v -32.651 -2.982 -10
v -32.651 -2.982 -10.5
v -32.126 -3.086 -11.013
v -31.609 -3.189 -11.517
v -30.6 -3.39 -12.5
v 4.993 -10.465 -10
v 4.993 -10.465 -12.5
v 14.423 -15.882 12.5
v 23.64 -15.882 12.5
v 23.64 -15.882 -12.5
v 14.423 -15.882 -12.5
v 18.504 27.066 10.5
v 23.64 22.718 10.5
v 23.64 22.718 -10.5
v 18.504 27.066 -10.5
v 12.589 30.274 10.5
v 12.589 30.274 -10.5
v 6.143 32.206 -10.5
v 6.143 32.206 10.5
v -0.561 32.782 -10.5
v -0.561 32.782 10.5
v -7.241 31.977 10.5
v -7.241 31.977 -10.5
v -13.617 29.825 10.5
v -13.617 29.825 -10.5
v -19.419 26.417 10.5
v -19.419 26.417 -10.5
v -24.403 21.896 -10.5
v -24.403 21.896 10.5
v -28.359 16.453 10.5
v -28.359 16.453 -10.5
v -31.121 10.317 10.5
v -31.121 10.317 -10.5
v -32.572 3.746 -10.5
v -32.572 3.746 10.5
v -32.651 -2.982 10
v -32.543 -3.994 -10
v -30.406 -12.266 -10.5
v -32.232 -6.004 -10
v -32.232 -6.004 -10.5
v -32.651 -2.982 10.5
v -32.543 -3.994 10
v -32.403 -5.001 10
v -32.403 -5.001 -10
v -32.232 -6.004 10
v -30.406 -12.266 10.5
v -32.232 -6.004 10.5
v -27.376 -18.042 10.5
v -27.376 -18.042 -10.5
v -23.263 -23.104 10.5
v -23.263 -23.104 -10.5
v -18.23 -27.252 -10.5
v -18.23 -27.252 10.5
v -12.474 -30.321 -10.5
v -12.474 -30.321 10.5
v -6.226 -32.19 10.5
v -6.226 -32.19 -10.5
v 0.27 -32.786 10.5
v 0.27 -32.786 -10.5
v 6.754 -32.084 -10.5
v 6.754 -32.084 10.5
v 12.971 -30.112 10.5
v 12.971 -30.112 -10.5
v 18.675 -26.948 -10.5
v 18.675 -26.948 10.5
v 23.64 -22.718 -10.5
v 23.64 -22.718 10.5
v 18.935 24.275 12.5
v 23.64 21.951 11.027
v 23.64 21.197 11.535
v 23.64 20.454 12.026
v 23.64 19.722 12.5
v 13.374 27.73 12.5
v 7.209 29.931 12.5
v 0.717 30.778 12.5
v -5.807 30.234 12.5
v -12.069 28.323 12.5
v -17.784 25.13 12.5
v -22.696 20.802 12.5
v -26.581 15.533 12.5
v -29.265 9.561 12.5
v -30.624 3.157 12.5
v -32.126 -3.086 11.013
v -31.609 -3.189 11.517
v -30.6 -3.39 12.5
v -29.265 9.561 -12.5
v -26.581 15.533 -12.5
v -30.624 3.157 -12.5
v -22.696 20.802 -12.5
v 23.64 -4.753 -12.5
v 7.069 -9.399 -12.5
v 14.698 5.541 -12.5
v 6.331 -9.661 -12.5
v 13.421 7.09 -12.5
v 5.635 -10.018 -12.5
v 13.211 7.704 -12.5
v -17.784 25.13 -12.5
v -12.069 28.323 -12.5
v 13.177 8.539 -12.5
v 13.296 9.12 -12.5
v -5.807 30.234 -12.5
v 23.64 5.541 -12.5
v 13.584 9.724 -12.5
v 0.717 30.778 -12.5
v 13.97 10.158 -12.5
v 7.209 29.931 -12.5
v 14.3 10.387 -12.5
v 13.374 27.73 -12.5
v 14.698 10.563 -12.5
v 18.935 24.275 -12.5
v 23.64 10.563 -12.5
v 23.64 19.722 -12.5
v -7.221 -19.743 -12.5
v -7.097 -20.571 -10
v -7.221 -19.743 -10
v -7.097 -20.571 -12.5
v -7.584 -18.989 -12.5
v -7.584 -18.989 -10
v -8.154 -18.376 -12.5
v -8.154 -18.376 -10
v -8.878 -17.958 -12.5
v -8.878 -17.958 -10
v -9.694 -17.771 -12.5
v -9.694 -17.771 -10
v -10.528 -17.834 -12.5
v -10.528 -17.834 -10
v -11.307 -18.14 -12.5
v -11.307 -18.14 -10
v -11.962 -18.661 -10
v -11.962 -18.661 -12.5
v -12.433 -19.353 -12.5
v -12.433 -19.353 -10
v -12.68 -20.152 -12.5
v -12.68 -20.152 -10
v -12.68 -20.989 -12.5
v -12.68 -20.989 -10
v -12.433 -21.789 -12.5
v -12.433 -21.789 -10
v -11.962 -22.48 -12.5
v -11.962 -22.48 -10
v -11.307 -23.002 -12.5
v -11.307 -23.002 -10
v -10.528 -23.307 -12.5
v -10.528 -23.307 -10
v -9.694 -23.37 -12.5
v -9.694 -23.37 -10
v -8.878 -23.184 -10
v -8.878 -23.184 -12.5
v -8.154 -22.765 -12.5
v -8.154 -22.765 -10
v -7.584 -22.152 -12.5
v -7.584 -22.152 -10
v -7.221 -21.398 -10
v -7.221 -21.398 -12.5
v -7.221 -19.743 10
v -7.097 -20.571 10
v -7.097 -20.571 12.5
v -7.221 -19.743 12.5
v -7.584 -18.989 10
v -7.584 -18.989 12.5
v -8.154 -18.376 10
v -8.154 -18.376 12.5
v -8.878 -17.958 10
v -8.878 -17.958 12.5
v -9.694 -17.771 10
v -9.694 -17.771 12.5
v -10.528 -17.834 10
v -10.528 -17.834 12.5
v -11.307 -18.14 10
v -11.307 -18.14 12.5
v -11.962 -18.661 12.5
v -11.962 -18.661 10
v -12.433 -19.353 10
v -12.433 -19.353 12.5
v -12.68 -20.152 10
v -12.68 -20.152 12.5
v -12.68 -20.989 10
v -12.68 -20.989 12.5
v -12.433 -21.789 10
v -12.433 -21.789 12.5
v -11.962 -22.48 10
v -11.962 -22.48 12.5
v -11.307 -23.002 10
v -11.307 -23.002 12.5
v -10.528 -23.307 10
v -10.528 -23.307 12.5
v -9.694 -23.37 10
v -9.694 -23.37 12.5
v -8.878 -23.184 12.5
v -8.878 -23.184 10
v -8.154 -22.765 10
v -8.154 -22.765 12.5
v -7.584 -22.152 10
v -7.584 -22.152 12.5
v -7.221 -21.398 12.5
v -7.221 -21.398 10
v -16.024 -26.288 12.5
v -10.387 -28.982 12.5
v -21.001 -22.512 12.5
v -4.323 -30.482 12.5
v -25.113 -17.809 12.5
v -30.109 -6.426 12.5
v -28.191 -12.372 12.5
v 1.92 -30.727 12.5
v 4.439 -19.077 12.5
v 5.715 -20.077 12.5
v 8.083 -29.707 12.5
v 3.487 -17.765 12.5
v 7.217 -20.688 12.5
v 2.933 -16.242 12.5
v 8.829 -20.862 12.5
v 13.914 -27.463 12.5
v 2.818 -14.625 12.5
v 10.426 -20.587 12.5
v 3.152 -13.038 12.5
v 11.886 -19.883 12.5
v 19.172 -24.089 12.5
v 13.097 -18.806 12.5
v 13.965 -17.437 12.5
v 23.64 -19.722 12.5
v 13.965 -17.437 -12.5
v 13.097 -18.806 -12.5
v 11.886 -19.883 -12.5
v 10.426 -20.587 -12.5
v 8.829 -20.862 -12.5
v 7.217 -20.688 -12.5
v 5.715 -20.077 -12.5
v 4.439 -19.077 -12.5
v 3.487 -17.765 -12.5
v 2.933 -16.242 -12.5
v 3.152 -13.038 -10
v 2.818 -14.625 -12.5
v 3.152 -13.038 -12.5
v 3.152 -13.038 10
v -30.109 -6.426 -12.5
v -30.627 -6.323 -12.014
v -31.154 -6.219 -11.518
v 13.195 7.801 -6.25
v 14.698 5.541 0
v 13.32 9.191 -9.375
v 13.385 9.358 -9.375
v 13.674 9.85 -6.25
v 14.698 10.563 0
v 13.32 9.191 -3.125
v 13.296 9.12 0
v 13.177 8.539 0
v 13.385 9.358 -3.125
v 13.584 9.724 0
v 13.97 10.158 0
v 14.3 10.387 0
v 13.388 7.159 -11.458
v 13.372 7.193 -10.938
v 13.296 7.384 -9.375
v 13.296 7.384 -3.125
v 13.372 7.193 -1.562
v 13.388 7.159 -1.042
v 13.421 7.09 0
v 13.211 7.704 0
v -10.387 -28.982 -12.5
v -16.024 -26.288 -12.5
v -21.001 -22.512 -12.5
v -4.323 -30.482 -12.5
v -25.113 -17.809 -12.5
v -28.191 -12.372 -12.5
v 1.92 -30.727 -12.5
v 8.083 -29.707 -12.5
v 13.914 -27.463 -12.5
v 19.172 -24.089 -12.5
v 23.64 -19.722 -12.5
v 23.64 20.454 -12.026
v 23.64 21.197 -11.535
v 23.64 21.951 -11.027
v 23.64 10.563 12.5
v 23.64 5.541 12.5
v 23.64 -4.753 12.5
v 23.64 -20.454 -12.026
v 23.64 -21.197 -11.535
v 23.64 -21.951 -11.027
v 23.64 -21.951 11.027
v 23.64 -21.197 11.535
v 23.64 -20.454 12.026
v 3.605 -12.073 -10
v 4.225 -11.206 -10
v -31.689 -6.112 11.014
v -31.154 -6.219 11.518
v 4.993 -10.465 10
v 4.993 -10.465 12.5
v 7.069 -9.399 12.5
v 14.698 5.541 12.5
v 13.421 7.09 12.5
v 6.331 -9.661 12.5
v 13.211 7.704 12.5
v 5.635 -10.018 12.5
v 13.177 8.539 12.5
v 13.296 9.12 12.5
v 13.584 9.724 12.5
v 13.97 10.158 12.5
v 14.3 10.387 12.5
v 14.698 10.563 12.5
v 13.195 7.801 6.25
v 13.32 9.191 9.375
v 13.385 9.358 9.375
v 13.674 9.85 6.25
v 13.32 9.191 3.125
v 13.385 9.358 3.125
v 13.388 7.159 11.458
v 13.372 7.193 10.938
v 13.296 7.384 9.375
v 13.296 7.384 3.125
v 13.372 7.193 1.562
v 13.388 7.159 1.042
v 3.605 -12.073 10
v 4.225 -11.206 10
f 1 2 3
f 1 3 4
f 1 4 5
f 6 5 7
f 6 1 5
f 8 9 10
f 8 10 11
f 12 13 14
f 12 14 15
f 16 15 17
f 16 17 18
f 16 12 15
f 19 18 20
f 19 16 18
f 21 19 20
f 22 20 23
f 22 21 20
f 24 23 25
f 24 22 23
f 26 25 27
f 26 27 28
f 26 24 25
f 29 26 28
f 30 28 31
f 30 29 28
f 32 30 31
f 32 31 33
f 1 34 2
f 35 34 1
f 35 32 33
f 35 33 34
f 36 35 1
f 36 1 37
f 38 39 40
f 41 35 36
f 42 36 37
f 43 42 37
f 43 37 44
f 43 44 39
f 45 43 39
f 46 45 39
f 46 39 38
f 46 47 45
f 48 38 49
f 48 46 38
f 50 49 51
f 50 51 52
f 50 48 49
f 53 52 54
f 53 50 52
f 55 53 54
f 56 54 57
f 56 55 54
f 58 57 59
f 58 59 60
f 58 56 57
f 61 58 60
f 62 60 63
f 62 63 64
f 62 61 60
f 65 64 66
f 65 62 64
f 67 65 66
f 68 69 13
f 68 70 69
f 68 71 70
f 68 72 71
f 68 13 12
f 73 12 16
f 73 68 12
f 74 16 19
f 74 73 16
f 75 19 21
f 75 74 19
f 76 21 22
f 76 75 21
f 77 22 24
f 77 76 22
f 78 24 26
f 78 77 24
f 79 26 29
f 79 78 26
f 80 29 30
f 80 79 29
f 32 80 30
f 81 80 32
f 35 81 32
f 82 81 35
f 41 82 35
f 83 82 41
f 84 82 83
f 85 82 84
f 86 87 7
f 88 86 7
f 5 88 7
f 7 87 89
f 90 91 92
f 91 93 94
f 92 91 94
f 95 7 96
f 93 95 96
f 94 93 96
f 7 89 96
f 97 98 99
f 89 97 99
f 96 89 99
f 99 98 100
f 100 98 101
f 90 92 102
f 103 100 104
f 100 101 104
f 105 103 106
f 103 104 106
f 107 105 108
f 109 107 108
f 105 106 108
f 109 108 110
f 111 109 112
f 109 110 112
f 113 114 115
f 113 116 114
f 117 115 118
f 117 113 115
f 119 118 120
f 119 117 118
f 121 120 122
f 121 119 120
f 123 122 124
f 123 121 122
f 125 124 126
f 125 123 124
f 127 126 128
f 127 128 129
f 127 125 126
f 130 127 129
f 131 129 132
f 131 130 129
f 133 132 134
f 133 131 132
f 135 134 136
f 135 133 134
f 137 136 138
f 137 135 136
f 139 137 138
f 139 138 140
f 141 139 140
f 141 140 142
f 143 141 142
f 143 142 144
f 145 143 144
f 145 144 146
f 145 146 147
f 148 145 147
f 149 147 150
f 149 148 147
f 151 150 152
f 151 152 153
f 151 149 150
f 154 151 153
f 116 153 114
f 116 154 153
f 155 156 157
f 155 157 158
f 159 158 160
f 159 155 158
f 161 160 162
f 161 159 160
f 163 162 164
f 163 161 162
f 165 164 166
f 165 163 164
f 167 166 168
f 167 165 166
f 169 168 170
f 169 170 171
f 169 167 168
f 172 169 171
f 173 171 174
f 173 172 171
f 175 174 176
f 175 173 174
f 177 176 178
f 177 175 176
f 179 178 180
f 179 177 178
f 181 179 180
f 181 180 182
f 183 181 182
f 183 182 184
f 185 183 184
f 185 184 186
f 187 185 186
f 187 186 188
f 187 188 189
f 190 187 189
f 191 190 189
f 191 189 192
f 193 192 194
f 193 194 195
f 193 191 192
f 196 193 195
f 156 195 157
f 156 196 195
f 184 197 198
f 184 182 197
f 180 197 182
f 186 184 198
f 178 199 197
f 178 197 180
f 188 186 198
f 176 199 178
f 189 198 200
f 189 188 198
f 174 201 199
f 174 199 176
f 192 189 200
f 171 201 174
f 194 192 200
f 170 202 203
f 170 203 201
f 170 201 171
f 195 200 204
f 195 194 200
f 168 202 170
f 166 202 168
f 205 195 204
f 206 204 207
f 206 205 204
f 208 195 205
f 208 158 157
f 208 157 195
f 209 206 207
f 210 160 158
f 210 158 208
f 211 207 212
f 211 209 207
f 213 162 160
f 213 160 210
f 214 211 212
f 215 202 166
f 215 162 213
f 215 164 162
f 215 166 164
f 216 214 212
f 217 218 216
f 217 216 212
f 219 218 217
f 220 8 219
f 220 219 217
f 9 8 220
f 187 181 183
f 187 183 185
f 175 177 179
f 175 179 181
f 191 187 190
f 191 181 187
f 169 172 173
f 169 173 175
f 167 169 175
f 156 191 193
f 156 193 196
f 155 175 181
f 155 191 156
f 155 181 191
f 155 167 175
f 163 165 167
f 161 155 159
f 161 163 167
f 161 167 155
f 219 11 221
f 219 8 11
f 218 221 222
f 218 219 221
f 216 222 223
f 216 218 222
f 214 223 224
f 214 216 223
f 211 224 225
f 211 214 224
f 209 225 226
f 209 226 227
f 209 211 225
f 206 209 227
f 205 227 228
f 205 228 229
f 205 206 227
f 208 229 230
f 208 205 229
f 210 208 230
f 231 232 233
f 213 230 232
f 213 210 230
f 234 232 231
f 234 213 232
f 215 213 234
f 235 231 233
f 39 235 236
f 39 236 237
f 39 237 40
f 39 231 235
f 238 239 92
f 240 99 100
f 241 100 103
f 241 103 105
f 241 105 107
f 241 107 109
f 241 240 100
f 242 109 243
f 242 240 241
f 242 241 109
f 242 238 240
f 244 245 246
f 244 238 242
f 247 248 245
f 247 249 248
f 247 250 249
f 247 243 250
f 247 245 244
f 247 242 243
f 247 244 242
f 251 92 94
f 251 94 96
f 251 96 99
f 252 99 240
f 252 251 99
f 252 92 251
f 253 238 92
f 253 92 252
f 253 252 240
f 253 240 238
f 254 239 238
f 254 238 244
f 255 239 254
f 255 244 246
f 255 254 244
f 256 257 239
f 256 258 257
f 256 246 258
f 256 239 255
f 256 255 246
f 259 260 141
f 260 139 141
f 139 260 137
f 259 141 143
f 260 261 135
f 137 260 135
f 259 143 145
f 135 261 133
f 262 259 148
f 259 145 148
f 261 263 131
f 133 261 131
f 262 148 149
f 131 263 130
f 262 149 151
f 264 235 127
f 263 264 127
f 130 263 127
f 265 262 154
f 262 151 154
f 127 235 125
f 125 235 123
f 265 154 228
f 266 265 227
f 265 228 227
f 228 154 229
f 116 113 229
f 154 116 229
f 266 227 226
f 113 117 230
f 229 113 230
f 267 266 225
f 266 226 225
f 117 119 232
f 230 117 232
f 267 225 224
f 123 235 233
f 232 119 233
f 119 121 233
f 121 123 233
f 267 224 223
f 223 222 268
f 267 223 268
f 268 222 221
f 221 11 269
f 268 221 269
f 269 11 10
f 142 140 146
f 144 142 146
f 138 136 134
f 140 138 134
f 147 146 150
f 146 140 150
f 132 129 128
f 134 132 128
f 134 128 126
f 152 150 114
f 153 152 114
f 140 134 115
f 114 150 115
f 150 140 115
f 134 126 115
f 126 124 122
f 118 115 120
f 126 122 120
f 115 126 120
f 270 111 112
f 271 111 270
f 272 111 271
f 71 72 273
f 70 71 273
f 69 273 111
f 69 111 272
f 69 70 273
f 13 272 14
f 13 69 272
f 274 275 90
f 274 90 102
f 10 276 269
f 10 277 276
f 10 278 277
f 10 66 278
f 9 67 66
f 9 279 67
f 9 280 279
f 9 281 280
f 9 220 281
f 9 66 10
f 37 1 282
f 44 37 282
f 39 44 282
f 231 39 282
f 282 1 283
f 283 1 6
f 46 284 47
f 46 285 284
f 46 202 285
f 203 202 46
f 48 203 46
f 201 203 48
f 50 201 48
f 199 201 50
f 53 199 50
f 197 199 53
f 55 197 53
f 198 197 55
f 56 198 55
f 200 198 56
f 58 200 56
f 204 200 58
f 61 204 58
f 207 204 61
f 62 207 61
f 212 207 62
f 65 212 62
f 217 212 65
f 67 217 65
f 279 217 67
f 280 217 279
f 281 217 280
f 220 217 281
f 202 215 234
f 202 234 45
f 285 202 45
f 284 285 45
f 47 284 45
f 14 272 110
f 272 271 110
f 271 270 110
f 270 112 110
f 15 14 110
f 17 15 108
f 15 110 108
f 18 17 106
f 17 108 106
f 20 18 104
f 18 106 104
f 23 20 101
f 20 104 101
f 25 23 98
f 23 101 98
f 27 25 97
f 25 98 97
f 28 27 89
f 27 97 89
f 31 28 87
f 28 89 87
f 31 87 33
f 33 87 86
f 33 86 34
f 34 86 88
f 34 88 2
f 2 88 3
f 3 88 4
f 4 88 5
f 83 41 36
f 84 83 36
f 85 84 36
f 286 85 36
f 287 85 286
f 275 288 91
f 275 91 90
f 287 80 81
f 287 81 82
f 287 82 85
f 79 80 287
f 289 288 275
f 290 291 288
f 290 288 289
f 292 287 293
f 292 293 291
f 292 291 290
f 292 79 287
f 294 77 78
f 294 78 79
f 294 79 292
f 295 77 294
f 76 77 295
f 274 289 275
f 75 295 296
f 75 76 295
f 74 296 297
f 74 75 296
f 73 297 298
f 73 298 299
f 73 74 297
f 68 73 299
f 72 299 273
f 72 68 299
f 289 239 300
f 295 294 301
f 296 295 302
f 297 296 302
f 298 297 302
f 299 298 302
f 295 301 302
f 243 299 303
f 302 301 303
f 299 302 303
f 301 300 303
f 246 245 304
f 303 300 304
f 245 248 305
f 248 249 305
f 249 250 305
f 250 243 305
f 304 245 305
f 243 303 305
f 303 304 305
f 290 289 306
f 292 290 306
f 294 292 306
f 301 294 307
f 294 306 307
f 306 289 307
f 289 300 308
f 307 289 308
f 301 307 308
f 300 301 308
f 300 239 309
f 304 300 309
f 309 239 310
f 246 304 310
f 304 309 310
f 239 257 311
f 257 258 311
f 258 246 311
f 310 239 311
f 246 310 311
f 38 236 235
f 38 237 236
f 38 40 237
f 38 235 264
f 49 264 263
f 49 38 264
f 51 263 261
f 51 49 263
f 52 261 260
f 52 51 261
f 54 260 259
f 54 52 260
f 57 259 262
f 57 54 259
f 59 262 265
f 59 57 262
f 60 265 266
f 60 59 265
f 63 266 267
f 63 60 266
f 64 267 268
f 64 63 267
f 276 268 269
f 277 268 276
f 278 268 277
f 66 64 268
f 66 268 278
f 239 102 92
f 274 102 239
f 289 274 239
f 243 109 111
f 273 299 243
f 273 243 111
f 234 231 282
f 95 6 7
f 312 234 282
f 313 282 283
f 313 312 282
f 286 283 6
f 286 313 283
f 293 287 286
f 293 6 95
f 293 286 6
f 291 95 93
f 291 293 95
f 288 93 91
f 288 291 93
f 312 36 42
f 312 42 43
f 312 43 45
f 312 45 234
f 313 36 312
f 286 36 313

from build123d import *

# Parameters (mm, degrees)
F1_DEPTH      = 12.5
F1_DEPTH_BACK = 12.5
F0_R          = 2.8070950027
F2_DEPTH      = 10
F2_DEPTH_BACK = 10
F3_DEPTH      = 10
F3_DEPTH_BACK = 10
F4_SIZE       = 2


with BuildPart() as f1:
    # F0 (on Top) → F1 (new body, two sides)
    with BuildSketch(Plane.XY) as f1_sk:
        with BuildLine():
            Line((23.6399736516, 10.5625083831), (23.6399736516, 22.7182886664))
            ThreePointArc((23.6399736516, 22.7182886664), (-13.6170982298, 29.8252180206), (-32.6508275376, -2.9820220135))
            Line((-32.6508275376, -2.9820220135), (4.9928135947, -10.4654852259))
            ThreePointArc((4.9928135947, -10.4654852259), (5.9769233021, -9.8277169412), (7.0685930008, -9.3993741227))
            Line((7.0685930008, -9.3993741227), (23.6399736516, -4.7530159354))
            Line((23.6399736516, -4.7530159354), (23.6399736516, 5.5410303175))
            Line((23.6399736516, 5.5410303175), (14.6979210516, 5.5410303175))
            add(Edge.make_bspline(
                [(14.6979210516, 5.5410303175), (13.8268778101, 6.4642787911), (12.7868333876, 7.4491397486), (13.3415861205, 10.1059010181), (14.6979210516, 10.5625083831)],
                knots=[0, 0, 0, 0, 0.4816059779, 1, 1, 1, 1], degree=3))
            Line((14.6979210516, 10.5625083831), (23.6399736516, 10.5625083831))
        make_face()
    extrude(amount=F1_DEPTH)
    extrude(f1_sk.sketch, amount=-F1_DEPTH_BACK)



with BuildPart() as f1b:
    # F0 (on Top) → F1, piece 2 (new body, two sides)
    with BuildSketch(Plane.XY) as f1_2_sk:
        with BuildLine():
            ThreePointArc((-32.2322682046, -6.0041552748), (-9.3966720268, -31.4113283546), (23.6399736516, -22.7182886664))
            Line((23.6399736516, -22.7182886664), (23.6399736516, -15.8816520533))
            Line((23.6399736516, -15.8816520533), (14.4234997289, -15.8816520533))
            ThreePointArc((14.4234997289, -15.8816520533), (7.2168926216, -20.6875953396), (3.1520300545, -13.0384666845))
            Line((3.1520300545, -13.0384666845), (-32.2322682046, -6.0041552748))
        make_face()
        with Locations((-9.9038304761, -20.5706935376)):
            Circle(F0_R, mode=Mode.SUBTRACT)
    extrude(amount=F1_DEPTH)
    extrude(f1_2_sk.sketch, amount=-F1_DEPTH_BACK)


with BuildPart() as f1_1:
    add(f1.part)

    add(f1b.part)  # F2 merges F1b
    # F0 (on Top) → F2 (join, two sides)
    with BuildSketch(Plane.XY) as f2_sk:
        with BuildLine():
            Line((4.9928135947, -10.4654852259), (-32.6508275376, -2.9820220135))
            ThreePointArc((-32.6508275376, -2.9820220135), (-32.4767201336, -4.4979599312), (-32.2322682046, -6.0041552748))
            Line((-32.2322682046, -6.0041552748), (3.1520300545, -13.0384666845))
            ThreePointArc((3.1520300545, -13.0384666845), (3.8949132368, -11.6249813025), (4.9928135947, -10.4654852259))
        make_face()
    extrude(amount=F2_DEPTH)
    extrude(f2_sk.sketch, amount=-F2_DEPTH_BACK)

    # F0 (on Top) → F3 (join, two sides)
    with BuildSketch(Plane.XY) as f3_sk:
        with Locations((-9.9038304761, -20.5706935376)):
            Circle(F0_R)
    extrude(amount=F3_DEPTH)
    extrude(f3_sk.sketch, amount=-F3_DEPTH_BACK)

    # F4
    f4_edges = [f1_1.edges().sort_by_distance(p)[0] for p in [
        (-13.617098, 29.825218, 12.5),
        (-9.396672, -31.411328, 12.5),
        (-13.617098, 29.825218, -12.5),
        (-9.396672, -31.411328, -12.5),
    ]]
    chamfer(f4_edges, length=F4_SIZE)


solid = f1_1.part
